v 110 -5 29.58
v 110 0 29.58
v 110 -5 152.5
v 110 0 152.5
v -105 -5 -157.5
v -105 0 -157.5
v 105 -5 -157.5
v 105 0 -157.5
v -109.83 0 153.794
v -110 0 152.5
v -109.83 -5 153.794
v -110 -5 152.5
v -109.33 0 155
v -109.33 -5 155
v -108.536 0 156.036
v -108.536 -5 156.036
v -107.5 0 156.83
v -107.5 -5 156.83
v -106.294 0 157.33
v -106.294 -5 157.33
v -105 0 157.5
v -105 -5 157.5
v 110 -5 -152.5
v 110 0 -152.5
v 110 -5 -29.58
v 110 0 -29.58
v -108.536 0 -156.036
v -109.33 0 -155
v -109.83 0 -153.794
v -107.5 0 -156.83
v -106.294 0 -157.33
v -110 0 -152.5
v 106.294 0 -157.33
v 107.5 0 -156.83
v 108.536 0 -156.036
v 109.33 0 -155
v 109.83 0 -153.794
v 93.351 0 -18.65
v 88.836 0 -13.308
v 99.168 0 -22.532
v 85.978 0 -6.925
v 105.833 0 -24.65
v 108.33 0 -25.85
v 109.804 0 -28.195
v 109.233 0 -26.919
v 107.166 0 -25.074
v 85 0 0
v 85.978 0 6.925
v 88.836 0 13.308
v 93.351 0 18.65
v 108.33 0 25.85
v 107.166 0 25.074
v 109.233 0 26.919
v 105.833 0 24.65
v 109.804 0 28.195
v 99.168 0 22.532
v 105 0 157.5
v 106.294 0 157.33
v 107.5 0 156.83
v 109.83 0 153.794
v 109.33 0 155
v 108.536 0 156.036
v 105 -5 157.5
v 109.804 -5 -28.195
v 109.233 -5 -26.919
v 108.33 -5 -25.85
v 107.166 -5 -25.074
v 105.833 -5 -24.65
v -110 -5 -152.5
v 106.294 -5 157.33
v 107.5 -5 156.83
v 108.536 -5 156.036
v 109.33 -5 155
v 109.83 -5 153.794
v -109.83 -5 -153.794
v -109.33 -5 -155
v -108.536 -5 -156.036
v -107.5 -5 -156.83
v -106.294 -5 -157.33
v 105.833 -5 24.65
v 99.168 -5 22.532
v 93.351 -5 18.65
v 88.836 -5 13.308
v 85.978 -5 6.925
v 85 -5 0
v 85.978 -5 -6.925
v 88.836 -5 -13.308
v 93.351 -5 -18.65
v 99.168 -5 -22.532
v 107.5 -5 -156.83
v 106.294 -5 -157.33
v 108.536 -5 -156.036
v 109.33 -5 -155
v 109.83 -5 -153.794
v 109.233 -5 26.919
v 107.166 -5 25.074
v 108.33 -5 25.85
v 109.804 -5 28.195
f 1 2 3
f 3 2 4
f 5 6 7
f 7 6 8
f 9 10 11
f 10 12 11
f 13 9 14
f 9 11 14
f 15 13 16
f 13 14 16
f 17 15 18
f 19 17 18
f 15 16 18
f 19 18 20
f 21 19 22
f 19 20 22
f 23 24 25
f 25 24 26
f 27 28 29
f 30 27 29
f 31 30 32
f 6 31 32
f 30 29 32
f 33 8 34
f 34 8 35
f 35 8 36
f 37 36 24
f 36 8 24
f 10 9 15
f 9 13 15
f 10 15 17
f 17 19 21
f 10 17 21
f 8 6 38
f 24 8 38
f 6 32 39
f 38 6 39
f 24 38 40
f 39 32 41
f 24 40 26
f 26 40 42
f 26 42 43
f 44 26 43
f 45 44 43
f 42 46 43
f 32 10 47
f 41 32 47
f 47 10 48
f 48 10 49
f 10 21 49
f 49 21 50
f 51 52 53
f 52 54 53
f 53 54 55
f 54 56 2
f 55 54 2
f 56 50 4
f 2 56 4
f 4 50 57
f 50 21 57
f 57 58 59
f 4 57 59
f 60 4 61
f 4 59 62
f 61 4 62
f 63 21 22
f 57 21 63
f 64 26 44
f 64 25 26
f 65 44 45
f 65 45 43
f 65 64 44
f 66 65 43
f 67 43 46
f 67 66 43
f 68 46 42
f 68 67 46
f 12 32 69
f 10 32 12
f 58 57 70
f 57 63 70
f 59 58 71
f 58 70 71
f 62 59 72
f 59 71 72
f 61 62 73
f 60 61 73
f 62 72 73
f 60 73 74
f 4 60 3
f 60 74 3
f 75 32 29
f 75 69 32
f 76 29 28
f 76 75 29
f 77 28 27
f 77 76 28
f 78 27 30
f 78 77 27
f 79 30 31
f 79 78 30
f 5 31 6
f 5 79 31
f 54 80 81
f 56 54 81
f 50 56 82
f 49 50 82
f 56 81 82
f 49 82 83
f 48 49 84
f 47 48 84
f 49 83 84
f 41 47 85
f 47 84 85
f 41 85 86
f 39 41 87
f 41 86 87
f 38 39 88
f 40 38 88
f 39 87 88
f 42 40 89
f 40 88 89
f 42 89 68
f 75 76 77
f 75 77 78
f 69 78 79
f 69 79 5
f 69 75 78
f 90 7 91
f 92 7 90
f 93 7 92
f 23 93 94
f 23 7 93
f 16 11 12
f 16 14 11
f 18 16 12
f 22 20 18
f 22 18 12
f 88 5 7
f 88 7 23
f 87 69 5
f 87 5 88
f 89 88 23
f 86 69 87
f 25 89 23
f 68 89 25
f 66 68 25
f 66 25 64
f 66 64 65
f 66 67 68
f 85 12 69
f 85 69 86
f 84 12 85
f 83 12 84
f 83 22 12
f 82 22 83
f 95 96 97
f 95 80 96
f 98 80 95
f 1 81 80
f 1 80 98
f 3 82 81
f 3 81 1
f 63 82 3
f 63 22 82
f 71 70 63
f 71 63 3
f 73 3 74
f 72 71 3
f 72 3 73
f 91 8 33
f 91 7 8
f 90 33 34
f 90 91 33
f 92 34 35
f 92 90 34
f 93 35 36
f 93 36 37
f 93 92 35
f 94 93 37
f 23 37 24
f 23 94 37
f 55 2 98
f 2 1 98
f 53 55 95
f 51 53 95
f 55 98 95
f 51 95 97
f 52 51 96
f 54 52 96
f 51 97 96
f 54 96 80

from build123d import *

# Parameters (mm, degrees)
F0_W     = 220
F0_H     = 315
F1_DEPTH = 5
F2_R     = 25
F3_DEPTH = 25
F4_R     = 5


with BuildPart() as f1:
    # F0 (on Front) → F1 (new body)
    with BuildSketch(Plane.XZ):
        Rectangle(F0_W, F0_H)
    extrude(amount=F1_DEPTH)

    # F2 (on face) → F3 (cut)
    with BuildSketch(Plane.XZ.offset(5)):
        with Locations((110, 0)):
            Circle(F2_R)
    extrude(amount=-F3_DEPTH, mode=Mode.SUBTRACT)

    # F4
    f4_edges = [f1.edges().sort_by_distance(p)[0] for p in [
        (110, -2.5, -25),
        (110, -2.5, 25),
        (110, -2.5, 157.5),
        (-110, -2.5, 157.5),
        (-110, -2.5, -157.5),
        (110, -2.5, -157.5),
    ]]
    fillet(f4_edges, radius=F4_R)


solid = f1.part
